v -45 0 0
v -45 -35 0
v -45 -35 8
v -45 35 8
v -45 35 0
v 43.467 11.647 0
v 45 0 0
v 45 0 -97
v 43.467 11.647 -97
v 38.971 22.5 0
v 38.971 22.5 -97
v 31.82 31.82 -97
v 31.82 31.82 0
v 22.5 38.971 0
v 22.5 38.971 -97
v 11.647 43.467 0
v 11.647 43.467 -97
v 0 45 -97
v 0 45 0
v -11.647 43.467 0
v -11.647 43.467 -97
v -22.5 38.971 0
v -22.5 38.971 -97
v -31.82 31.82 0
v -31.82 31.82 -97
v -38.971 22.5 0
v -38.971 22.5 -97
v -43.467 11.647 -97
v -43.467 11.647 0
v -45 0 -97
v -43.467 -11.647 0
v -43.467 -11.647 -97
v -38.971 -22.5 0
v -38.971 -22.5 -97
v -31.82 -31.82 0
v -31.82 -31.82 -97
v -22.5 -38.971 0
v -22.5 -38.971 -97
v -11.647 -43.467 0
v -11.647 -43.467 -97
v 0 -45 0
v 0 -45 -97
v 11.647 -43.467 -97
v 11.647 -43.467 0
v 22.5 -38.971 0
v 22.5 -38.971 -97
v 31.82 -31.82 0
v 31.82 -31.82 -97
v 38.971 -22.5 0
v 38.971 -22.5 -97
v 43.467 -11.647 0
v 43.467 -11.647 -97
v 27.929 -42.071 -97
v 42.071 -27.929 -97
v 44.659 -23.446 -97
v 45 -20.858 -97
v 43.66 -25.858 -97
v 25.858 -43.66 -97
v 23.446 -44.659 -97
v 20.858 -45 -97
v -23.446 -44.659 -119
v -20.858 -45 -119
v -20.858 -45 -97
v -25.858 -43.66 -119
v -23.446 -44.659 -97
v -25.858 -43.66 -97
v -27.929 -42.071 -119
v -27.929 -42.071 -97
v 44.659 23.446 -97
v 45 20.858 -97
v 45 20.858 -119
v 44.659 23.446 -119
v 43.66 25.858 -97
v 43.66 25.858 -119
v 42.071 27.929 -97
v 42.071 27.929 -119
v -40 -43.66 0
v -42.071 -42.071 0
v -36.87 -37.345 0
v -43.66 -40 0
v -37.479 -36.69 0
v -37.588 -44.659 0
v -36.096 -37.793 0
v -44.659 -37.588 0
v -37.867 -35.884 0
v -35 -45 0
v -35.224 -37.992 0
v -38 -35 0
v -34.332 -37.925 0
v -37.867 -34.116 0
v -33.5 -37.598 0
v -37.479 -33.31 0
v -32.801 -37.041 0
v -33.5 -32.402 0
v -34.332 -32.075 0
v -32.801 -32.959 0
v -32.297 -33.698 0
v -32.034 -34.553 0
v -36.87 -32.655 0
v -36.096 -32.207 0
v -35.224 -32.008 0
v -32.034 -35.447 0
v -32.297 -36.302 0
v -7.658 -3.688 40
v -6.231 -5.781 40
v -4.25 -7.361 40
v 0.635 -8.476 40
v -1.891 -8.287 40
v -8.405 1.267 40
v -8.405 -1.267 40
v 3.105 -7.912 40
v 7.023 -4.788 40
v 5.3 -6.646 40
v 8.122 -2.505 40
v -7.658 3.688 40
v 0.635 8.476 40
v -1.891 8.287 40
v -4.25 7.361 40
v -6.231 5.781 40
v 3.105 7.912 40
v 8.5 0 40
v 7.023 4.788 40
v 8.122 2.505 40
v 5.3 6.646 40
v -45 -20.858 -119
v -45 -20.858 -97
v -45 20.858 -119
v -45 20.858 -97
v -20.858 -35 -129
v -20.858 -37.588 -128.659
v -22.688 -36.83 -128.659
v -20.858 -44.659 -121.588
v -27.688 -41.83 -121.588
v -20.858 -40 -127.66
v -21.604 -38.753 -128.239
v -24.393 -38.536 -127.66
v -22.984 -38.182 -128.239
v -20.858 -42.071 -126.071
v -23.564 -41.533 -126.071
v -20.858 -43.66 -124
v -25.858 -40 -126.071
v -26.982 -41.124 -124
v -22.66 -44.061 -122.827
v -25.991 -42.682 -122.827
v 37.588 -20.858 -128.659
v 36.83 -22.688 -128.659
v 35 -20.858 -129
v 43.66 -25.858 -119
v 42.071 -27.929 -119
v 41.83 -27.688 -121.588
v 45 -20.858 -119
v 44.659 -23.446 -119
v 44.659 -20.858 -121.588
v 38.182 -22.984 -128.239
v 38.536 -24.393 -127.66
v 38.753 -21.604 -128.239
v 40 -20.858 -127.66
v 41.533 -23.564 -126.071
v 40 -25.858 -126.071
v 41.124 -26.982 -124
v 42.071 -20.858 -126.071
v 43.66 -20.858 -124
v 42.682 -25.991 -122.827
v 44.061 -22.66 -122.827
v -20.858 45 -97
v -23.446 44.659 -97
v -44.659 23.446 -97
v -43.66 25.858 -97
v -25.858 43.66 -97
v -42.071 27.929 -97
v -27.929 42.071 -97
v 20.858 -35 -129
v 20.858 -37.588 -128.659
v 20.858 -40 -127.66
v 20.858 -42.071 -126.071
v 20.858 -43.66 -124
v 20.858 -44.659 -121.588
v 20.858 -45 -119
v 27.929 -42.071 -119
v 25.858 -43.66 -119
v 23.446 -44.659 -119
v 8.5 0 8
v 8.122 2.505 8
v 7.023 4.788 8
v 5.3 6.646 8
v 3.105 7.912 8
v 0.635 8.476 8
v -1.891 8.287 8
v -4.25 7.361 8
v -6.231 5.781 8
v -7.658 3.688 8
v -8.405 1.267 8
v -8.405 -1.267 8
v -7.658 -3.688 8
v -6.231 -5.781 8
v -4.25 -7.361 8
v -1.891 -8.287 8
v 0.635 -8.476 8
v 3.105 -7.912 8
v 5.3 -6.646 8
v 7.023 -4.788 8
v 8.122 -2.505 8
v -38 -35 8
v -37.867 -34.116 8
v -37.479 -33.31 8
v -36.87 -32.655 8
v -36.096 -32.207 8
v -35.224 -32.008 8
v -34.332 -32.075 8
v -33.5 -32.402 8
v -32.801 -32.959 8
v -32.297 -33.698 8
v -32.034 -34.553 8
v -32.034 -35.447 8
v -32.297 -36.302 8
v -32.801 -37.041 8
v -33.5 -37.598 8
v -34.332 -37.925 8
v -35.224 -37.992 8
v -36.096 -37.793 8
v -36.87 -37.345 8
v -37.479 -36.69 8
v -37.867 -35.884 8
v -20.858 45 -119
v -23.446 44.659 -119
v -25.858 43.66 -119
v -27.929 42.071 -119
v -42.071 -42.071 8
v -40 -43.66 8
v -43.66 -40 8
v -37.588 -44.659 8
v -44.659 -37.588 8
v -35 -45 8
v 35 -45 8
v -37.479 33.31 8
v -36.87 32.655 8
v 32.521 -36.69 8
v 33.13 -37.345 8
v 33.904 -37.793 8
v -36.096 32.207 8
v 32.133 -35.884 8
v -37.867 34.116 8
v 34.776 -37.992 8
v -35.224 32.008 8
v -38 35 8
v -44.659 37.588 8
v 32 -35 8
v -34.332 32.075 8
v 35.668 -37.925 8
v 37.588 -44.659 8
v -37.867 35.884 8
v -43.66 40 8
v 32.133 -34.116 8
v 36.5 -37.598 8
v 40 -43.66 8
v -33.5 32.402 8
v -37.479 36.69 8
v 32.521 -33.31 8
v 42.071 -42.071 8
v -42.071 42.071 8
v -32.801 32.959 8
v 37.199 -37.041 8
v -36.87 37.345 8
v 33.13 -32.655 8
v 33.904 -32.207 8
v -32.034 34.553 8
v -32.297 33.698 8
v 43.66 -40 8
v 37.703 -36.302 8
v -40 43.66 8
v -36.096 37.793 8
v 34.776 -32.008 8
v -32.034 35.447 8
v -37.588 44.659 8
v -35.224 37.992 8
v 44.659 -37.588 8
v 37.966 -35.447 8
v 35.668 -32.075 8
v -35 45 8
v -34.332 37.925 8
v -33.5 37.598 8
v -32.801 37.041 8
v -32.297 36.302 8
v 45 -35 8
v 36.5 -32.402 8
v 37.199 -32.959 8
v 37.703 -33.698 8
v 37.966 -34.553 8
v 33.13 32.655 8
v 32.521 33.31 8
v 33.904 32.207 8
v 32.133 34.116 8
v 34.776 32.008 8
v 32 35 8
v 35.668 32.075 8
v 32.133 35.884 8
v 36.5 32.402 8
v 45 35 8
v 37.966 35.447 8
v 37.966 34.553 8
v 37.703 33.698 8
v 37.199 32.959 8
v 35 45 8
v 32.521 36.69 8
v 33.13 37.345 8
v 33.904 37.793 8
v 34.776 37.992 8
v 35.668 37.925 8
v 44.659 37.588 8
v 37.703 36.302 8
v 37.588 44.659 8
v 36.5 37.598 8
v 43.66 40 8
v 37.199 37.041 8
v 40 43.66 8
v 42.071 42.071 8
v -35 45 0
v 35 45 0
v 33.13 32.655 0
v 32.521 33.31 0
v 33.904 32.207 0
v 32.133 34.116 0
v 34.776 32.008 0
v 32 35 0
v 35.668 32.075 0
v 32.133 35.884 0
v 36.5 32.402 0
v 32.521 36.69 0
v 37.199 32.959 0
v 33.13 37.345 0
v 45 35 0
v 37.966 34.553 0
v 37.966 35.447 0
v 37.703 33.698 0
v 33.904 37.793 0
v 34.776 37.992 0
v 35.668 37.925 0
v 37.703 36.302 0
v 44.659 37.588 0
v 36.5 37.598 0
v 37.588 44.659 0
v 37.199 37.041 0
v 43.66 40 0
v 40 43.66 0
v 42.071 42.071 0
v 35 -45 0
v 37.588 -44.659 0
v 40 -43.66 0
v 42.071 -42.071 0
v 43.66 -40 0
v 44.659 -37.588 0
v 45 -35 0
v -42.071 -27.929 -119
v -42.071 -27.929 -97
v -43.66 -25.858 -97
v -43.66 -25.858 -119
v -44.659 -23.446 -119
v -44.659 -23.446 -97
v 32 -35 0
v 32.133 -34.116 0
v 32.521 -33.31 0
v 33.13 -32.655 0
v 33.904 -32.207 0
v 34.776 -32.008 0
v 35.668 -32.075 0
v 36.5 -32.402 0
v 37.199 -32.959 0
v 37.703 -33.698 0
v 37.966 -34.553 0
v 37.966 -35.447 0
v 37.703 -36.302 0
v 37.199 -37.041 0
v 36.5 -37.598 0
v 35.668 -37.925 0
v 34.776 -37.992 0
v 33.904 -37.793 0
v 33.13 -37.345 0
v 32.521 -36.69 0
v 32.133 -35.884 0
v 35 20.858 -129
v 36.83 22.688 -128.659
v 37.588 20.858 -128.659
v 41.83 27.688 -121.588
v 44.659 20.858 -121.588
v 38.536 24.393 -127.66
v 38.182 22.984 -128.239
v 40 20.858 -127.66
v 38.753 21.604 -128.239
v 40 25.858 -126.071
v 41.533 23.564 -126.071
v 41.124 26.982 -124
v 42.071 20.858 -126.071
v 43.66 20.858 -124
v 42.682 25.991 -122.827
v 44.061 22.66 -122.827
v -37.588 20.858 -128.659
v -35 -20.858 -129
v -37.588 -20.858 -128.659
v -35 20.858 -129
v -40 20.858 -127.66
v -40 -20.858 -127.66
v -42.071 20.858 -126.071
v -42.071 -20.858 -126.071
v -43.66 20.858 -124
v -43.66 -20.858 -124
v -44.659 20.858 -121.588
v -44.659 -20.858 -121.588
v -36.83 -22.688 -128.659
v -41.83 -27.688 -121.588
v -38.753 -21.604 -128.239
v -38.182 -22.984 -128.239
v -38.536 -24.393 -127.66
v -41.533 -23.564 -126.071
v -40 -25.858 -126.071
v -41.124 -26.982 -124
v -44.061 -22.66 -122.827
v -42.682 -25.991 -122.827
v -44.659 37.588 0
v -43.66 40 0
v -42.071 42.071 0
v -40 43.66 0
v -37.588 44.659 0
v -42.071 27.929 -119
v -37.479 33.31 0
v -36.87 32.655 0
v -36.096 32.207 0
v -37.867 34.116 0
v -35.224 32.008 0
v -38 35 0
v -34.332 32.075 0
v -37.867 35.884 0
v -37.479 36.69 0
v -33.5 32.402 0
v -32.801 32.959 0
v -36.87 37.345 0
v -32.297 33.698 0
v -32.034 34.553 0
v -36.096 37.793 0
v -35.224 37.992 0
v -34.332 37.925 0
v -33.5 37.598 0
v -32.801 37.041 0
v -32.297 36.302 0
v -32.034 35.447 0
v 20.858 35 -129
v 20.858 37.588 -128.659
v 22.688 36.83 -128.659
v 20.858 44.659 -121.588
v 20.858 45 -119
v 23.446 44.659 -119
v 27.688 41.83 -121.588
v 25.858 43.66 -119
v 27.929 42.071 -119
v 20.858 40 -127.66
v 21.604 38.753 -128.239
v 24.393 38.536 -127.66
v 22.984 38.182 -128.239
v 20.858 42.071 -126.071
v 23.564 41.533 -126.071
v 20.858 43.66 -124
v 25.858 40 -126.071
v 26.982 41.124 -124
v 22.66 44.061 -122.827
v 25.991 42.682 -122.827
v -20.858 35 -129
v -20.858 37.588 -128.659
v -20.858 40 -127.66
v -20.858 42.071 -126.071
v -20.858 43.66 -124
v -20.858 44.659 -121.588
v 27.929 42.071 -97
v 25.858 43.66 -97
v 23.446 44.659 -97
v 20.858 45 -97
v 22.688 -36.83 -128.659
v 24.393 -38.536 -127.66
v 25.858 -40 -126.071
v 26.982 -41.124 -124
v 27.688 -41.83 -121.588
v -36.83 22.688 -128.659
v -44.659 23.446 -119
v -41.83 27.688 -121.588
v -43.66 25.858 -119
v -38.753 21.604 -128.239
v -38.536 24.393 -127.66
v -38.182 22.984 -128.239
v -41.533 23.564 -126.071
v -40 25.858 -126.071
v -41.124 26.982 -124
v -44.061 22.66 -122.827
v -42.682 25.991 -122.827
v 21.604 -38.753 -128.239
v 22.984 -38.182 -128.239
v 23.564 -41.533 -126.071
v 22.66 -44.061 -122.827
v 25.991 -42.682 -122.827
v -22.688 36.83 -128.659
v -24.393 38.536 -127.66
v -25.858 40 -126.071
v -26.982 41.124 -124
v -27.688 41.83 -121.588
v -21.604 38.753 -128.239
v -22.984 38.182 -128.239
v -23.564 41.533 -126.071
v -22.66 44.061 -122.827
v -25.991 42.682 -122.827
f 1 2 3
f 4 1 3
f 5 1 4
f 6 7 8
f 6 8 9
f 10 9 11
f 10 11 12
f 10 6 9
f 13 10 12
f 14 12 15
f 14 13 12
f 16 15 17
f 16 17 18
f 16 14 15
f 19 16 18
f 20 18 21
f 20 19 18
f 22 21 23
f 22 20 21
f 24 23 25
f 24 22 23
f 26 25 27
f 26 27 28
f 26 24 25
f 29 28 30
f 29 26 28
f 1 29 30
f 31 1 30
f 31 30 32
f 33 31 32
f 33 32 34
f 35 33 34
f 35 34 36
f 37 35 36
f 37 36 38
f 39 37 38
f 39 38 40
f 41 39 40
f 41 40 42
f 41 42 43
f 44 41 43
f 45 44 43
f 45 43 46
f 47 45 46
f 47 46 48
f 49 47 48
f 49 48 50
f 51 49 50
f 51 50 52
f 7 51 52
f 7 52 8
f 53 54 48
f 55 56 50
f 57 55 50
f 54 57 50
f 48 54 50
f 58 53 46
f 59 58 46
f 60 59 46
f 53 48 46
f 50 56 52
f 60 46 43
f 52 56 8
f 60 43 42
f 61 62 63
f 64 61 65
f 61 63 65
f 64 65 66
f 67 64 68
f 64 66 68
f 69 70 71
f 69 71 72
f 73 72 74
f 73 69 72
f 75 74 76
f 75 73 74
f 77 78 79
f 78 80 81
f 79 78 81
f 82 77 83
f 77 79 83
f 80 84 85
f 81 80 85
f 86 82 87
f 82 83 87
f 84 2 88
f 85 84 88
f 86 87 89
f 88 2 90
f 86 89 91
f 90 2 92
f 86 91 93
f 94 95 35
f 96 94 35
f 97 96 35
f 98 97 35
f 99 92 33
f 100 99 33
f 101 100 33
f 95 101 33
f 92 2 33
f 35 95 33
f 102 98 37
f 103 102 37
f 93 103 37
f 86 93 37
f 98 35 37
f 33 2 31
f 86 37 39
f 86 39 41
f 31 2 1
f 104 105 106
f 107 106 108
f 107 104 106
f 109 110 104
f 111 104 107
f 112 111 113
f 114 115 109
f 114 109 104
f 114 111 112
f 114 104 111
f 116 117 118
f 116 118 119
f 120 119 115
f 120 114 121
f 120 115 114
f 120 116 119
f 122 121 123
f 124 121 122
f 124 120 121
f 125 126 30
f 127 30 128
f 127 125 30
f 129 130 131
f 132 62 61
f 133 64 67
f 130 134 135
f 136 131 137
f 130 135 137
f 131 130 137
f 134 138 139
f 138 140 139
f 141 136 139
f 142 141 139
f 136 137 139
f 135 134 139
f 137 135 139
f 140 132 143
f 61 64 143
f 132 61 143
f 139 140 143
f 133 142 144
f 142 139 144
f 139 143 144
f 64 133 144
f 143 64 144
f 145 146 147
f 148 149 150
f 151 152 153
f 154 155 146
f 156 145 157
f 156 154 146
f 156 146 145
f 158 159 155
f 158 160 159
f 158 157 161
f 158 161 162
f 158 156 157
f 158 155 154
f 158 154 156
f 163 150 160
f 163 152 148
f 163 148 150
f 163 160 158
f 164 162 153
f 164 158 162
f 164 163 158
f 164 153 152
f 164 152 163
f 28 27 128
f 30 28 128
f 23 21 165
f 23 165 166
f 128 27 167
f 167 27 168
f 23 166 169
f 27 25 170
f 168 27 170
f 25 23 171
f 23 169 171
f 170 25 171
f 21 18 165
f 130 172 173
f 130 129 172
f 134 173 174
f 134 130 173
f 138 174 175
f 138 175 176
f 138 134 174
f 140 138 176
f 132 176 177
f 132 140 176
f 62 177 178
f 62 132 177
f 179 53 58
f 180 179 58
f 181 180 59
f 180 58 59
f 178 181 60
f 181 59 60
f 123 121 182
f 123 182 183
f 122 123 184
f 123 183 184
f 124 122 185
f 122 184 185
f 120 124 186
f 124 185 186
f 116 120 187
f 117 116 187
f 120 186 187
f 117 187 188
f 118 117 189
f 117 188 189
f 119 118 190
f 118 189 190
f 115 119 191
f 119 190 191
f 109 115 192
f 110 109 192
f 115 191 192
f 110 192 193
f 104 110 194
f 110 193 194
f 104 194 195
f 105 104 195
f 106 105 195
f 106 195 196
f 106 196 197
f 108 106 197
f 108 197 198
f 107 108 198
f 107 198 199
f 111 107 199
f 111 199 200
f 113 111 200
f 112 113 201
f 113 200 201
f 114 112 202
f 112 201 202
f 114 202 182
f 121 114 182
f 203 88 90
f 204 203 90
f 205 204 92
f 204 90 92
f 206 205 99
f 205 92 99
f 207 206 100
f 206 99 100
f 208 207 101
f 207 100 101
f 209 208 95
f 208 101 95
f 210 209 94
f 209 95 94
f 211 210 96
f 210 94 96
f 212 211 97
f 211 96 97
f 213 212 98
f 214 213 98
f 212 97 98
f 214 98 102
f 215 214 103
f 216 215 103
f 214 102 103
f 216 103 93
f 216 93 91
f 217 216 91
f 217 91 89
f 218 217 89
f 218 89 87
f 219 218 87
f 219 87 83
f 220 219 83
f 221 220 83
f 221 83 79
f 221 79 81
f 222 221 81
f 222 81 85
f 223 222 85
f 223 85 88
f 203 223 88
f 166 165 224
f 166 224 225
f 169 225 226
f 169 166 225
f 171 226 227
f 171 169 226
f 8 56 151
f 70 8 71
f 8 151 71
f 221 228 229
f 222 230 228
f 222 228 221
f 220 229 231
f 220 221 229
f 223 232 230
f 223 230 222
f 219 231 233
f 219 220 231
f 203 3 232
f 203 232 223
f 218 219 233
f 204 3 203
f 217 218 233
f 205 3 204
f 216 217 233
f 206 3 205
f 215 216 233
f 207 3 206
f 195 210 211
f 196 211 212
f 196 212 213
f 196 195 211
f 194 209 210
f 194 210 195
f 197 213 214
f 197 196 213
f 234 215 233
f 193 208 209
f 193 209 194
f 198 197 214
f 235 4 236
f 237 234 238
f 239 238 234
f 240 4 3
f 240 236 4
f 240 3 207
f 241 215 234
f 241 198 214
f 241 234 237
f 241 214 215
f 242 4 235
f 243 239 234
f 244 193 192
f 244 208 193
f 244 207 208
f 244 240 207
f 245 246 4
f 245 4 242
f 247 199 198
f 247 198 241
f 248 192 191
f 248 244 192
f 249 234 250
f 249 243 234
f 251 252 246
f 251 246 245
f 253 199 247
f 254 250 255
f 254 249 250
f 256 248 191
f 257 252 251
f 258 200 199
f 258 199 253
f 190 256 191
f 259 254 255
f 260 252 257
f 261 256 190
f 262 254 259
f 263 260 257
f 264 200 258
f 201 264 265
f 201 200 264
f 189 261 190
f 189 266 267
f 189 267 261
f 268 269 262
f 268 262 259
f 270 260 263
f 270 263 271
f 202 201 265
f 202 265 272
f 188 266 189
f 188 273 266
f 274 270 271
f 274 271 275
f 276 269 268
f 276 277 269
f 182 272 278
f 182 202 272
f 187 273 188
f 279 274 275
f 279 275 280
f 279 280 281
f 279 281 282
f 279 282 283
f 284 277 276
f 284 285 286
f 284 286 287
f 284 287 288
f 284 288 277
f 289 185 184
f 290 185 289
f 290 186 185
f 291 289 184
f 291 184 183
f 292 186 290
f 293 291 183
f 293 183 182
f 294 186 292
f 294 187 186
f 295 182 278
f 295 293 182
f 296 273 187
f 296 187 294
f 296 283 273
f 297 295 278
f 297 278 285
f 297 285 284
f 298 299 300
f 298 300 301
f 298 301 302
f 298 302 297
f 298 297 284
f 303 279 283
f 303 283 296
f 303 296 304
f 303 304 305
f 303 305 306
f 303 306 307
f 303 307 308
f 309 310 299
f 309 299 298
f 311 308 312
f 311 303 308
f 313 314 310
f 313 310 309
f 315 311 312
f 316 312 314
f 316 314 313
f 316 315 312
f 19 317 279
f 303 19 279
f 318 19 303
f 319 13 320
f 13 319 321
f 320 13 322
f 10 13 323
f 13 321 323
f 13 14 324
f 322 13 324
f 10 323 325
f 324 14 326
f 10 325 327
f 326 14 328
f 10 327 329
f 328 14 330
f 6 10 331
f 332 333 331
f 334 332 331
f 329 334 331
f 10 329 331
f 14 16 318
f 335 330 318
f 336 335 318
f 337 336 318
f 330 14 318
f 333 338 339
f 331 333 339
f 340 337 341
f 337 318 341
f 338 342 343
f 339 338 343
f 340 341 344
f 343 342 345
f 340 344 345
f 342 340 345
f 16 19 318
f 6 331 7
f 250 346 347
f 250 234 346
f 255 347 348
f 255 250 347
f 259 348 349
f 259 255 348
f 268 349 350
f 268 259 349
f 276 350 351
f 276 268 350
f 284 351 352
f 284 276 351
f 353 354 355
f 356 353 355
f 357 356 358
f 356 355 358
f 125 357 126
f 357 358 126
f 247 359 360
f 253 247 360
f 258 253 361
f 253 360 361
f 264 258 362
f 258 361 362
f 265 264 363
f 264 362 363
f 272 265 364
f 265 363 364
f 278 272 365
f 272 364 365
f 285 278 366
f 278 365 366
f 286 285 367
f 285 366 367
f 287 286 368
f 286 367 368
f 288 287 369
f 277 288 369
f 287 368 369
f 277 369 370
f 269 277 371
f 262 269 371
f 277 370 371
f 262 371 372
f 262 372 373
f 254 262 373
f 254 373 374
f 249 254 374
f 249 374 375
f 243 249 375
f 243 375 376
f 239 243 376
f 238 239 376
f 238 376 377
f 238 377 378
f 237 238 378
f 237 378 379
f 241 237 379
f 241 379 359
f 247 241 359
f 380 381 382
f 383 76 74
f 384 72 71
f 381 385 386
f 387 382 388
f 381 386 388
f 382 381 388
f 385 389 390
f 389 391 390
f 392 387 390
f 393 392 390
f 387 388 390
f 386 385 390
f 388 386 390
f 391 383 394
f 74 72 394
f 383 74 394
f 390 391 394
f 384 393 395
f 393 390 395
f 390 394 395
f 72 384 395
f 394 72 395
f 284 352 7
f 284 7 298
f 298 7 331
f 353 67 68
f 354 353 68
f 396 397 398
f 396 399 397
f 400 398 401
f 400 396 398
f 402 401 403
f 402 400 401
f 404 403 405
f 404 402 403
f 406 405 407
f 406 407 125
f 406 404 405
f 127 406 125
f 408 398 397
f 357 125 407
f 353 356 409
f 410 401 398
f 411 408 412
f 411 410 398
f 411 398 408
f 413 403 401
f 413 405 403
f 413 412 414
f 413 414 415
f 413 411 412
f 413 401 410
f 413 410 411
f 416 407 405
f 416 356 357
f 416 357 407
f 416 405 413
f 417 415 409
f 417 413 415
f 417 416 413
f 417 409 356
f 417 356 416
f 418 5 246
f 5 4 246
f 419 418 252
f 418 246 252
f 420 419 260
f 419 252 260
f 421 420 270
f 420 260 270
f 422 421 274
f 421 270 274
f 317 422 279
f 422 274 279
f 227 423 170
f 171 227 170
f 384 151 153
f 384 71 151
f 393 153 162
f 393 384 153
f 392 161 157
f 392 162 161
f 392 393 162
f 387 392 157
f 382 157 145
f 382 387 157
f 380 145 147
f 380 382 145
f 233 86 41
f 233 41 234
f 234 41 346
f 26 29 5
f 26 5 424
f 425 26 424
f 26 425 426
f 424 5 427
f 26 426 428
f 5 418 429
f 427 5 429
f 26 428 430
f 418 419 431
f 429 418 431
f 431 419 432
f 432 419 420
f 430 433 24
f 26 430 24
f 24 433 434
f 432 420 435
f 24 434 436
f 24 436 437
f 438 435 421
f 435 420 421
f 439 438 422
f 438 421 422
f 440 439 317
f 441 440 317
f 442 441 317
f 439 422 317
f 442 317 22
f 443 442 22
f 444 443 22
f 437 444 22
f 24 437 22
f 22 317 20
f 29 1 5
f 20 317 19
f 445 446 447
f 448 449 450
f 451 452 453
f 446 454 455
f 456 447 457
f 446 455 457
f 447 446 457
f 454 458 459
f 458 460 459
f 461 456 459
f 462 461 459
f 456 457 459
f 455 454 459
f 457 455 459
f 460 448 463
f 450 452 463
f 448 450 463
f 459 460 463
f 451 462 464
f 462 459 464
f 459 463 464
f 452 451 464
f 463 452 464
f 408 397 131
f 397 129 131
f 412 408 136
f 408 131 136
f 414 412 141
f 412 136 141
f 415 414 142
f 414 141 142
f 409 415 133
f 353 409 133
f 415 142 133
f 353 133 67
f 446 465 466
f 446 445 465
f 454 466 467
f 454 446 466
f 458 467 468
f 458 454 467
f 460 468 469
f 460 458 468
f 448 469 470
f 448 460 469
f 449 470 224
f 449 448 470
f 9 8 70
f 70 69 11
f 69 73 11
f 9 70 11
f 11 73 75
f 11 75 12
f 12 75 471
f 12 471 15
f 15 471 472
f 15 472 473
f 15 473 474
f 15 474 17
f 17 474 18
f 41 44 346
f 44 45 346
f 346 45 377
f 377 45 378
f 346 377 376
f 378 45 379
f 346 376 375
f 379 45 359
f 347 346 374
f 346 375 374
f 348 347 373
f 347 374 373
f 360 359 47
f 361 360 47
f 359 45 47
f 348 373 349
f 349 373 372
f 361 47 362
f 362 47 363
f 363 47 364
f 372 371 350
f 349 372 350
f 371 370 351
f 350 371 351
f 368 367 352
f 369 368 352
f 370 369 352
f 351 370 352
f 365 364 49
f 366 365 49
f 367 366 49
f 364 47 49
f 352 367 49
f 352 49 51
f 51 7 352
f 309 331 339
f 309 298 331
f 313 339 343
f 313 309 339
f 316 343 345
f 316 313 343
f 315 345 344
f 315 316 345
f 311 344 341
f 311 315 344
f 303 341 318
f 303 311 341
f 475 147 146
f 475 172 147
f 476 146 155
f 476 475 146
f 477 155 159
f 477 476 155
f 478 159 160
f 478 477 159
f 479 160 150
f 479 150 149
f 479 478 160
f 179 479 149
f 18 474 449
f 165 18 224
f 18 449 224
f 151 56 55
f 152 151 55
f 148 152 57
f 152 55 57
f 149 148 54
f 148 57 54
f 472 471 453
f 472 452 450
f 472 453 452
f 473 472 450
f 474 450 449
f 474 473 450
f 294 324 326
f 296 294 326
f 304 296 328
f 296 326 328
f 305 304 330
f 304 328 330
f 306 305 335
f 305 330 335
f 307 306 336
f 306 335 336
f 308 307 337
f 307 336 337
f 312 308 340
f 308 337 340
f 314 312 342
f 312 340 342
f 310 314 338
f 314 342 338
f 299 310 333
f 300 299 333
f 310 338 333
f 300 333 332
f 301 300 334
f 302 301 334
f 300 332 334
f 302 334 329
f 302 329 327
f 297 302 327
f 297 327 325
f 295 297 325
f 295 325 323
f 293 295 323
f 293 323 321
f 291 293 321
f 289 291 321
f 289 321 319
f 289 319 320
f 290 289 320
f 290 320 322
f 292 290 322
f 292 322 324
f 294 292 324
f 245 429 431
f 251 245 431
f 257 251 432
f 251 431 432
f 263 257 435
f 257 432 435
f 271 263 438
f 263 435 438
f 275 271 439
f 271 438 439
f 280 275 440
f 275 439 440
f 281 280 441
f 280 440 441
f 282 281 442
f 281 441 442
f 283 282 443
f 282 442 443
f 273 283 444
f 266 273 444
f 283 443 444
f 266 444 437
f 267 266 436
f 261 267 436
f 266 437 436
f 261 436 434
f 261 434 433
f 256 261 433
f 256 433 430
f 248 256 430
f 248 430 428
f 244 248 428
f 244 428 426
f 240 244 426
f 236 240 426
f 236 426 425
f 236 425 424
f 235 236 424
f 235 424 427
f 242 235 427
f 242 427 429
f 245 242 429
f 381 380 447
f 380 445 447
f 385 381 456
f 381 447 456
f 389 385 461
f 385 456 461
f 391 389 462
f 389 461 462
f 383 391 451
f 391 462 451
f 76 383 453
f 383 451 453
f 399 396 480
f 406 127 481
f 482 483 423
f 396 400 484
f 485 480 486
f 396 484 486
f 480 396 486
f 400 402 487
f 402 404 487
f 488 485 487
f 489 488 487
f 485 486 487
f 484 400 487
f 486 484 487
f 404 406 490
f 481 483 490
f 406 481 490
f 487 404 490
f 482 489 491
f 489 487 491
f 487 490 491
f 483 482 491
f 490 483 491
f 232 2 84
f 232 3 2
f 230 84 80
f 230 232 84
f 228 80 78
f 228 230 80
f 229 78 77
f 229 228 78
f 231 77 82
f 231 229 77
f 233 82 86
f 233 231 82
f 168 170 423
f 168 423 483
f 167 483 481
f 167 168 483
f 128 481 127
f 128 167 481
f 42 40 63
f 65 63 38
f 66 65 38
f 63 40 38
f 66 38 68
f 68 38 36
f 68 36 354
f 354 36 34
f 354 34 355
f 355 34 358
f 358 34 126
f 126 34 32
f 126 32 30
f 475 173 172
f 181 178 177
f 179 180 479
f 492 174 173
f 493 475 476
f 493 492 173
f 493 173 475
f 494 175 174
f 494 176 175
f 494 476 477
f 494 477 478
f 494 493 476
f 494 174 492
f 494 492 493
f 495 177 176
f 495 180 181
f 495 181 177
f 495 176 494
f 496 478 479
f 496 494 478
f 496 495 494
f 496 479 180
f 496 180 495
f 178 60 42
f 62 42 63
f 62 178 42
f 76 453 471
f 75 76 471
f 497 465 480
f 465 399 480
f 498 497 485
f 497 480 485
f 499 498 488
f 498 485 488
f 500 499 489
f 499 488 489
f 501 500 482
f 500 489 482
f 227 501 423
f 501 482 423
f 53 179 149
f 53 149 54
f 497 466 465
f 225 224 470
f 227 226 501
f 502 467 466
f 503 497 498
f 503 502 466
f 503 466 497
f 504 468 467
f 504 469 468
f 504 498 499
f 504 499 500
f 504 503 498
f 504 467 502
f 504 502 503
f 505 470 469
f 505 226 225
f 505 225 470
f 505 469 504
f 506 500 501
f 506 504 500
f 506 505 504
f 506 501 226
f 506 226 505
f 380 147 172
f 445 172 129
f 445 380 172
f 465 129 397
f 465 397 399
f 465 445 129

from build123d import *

# Parameters (mm, degrees)
SKETCH1_W                   = 90
SKETCH1_H                   = 90
BOSS_EXTRUDE1_DEPTH         = 8
FILLET1_R                   = 10
SKETCH2_R                   = 45
BOSS_EXTRUDE2_DEPTH         = 137
SKETCH3_R                   = 8.5
BOSS_EXTRUDE3_DEPTH         = 32
F_6_0_MM_DOWEL_HOLES1_D     = 6
F_6_0_MM_DOWEL_HOLES1_DEPTH = 30
F_6_0_MM_DOWEL_HOLES1_TIP   = 1.802581857
SKETCH8_W                   = 90
SKETCH8_H                   = 90
BOSS_EXTRUDE4_DEPTH         = 32
CHAMFER2_SIZE               = 20
FILLET2_R                   = 10


with BuildPart() as part:
    # Sketch1 → Boss-Extrude1 (new body)
    with BuildSketch(Plane.XY):
        Rectangle(SKETCH1_W, SKETCH1_H)
    extrude(amount=BOSS_EXTRUDE1_DEPTH)

    # Fillet1
    fillet1_edges = [part.edges().sort_by_distance(p)[0] for p in [
        (-45, 45, 4),
        (45, 45, 4),
        (45, -45, 4),
        (-45, -45, 4),
    ]]
    fillet(fillet1_edges, radius=FILLET1_R)

    # Sketch2 → Boss-Extrude2 (add)
    with BuildSketch(Plane.XY.offset(8)):
        Circle(SKETCH2_R)
    extrude(amount=-BOSS_EXTRUDE2_DEPTH)

    # Sketch3 → Boss-Extrude3 (add)
    with BuildSketch(Plane.XY.offset(8)):
        Circle(SKETCH3_R)
    extrude(amount=BOSS_EXTRUDE3_DEPTH)

    # Ø6.0 mm Dowel Holes1
    with Locations(Plane.XY.offset(8)):
        with Locations((-35, 35), (35, 35), (35, -35), (-35, -35)):
            Hole(F_6_0_MM_DOWEL_HOLES1_D / 2, depth=F_6_0_MM_DOWEL_HOLES1_DEPTH)
            with Locations((0, 0, -(F_6_0_MM_DOWEL_HOLES1_DEPTH + F_6_0_MM_DOWEL_HOLES1_TIP / 2))):  # 118° drill point
                Cone(0, F_6_0_MM_DOWEL_HOLES1_D / 2, F_6_0_MM_DOWEL_HOLES1_TIP, mode=Mode.SUBTRACT)

    # Sketch8 → Boss-Extrude4 (add)
    with BuildSketch(Plane(origin=(0, 0, -129), x_dir=(-1, 0, 0), z_dir=(0, 0, -1))):
        Rectangle(SKETCH8_W, SKETCH8_H)
    extrude(amount=-BOSS_EXTRUDE4_DEPTH)

    # Chamfer2
    chamfer2_edges = [part.edges().sort_by_distance(p)[0] for p in [
        (45, -45, -113),
        (45, 45, -113),
        (-45, 45, -113),
        (-45, -45, -113),
    ]]
    chamfer(chamfer2_edges, length=CHAMFER2_SIZE)

    # Fillet2
    fillet2_edges = [part.edges().sort_by_distance(p)[0] for p in [
        (45, 0, -129),
        (45, 25, -113),
        (45, -25, -113),
        (-45, 0, -129),
        (0, 45, -129),
        (0, -45, -129),
        (35, 35, -129),
        (-35, 35, -129),
        (-35, -35, -129),
        (35, -35, -129),
        (-25, -45, -113),
        (25, -45, -113),
        (-45, 25, -113),
        (-45, -25, -113),
        (25, 45, -113),
        (-25, 45, -113),
    ]]
    fillet(fillet2_edges, radius=FILLET2_R)


solid = part.part
